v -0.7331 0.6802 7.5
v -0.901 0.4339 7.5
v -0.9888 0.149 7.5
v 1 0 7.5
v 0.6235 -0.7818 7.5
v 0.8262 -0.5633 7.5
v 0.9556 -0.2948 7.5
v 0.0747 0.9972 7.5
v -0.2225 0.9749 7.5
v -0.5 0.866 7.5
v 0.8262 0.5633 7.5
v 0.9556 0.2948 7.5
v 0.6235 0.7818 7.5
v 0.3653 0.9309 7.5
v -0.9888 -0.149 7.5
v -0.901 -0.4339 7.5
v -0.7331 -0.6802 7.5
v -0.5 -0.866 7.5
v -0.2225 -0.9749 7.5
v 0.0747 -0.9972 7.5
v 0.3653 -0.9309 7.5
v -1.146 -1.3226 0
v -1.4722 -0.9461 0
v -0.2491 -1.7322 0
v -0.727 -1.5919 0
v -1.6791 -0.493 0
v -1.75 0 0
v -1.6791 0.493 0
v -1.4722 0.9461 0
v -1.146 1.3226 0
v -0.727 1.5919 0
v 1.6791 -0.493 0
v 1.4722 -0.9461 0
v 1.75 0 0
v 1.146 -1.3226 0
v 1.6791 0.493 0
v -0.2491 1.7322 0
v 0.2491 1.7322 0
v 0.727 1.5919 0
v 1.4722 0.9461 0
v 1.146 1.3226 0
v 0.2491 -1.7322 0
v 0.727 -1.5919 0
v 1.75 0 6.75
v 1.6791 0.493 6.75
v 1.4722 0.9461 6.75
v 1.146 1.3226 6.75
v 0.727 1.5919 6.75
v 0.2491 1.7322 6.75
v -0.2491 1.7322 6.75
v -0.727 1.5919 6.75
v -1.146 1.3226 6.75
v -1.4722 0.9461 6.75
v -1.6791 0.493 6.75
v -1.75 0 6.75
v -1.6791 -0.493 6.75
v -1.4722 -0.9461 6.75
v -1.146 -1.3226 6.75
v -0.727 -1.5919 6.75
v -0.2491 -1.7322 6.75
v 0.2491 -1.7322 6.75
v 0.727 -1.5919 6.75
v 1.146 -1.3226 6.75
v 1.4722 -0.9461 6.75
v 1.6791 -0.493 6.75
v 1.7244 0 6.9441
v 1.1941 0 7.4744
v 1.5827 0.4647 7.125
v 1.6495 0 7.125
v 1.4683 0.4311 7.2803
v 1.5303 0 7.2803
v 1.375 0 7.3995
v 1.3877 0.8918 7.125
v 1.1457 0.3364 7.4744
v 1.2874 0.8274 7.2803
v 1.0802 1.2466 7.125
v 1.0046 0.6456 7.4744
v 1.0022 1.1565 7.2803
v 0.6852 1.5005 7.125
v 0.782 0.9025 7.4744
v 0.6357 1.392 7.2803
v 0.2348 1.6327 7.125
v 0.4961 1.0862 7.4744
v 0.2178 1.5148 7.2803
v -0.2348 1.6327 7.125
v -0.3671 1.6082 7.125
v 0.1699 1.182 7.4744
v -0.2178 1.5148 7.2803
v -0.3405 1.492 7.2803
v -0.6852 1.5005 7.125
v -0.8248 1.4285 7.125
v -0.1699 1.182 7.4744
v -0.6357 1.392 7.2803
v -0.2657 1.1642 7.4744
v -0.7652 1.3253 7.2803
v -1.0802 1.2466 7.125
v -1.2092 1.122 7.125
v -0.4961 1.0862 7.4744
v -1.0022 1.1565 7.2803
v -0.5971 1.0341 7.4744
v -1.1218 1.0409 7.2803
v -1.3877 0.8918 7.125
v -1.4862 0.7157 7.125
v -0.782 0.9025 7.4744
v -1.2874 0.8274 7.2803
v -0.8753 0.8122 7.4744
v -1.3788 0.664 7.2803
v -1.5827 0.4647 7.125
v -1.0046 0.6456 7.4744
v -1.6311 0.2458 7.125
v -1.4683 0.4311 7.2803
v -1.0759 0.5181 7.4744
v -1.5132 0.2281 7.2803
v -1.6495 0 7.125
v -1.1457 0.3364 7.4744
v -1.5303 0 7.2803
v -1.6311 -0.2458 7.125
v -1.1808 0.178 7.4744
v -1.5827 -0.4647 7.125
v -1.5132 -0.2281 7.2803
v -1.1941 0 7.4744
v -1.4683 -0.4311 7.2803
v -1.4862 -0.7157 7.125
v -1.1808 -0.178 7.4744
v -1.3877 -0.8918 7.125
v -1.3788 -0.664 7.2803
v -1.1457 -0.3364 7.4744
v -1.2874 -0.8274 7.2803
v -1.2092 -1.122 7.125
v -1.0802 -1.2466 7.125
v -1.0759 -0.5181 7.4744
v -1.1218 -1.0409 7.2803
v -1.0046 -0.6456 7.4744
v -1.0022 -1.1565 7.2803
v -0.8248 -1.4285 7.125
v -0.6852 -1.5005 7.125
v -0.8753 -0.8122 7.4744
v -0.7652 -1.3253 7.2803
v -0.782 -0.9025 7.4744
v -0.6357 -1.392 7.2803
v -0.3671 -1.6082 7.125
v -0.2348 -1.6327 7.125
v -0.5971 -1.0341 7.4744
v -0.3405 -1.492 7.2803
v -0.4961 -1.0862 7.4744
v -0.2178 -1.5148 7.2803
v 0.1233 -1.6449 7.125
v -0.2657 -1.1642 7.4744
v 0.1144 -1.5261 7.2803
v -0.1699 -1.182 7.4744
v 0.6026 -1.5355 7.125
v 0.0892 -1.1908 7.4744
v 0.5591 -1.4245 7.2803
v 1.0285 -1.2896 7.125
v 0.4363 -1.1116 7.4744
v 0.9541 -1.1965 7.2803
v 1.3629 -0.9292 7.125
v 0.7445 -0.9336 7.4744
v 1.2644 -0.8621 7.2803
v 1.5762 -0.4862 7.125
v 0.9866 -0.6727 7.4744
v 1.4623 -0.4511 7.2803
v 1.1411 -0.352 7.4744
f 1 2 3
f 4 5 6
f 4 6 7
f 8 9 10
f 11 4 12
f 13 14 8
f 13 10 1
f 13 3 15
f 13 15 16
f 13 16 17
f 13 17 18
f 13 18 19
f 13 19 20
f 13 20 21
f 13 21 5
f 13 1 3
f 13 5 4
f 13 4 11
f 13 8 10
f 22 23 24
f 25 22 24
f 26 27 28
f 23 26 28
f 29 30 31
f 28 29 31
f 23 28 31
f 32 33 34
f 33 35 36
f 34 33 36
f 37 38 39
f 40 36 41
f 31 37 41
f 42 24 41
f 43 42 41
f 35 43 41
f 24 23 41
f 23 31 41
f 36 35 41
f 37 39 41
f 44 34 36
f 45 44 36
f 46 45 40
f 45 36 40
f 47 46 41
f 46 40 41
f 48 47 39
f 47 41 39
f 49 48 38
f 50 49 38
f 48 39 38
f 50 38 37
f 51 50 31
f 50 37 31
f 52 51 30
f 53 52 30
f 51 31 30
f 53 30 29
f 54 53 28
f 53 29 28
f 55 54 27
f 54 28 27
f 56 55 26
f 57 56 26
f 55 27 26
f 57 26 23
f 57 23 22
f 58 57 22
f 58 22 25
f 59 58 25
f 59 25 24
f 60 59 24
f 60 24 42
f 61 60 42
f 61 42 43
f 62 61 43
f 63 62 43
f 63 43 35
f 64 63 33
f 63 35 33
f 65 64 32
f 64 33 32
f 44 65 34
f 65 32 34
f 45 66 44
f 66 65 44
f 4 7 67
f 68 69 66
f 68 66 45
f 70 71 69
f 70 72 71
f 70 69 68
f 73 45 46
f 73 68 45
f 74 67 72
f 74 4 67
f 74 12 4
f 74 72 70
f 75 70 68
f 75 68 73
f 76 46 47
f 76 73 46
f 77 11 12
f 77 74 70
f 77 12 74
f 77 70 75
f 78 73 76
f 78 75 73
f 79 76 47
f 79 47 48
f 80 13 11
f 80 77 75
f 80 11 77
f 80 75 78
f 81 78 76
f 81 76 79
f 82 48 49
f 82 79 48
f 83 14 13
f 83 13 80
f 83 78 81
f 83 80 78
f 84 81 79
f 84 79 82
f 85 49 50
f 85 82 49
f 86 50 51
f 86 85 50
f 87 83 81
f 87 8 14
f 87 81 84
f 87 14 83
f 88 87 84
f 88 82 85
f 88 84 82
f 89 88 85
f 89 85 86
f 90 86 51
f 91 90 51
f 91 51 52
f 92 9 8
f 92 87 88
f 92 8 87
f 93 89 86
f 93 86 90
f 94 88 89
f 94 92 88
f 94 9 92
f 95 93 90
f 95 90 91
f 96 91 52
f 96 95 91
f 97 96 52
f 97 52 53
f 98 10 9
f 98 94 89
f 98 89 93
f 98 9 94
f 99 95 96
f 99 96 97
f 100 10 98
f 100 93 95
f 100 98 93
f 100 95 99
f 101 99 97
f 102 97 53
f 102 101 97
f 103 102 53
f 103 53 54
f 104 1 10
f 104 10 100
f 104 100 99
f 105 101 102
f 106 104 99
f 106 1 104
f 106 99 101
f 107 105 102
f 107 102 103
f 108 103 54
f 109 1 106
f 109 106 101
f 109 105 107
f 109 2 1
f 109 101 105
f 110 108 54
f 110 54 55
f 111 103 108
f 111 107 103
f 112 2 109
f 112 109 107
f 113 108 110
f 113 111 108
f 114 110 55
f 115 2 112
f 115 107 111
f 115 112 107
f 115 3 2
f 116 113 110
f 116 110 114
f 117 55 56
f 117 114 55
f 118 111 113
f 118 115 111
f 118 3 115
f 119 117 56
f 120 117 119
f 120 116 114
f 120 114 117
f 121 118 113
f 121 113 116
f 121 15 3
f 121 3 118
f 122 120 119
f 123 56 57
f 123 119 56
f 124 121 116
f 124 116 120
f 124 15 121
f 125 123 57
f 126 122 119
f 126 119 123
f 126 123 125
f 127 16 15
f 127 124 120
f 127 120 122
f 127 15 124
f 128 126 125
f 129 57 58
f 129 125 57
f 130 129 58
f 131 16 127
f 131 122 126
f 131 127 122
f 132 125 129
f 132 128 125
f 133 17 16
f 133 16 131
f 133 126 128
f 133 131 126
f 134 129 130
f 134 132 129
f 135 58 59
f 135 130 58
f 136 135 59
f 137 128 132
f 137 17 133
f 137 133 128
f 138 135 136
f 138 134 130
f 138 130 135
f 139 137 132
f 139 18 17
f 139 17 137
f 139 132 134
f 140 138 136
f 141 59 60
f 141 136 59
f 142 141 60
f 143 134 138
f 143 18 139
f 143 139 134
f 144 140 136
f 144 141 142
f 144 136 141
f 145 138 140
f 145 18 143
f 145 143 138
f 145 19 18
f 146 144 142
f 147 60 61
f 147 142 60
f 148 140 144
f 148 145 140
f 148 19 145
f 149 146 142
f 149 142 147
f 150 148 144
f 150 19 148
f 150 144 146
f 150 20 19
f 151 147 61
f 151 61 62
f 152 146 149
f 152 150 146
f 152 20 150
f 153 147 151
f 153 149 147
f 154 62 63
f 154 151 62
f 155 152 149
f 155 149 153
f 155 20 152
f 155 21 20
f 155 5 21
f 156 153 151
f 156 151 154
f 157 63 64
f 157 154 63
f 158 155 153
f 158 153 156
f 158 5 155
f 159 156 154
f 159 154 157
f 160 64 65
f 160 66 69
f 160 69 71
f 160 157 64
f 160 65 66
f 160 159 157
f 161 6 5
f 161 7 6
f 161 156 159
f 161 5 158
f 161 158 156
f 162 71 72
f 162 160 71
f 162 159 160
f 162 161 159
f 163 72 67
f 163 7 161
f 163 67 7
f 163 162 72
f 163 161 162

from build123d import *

# Parameters (mm, degrees)
F0_R     = 3.5
F1_DEPTH = 15
F2_R     = 1.5
F3_SCALE = 0.5


with BuildPart() as f1:
    # F0 (on Top) → F1 (new body)
    with BuildSketch(Plane.XY):
        Circle(F0_R)
    extrude(amount=F1_DEPTH)

    # F2
    f2_edges = [f1.edges().sort_by_distance(p)[0] for p in [
        (-3.5, 0, 15),
    ]]
    fillet(f2_edges, radius=F2_R)


with BuildPart() as f1_1:
    # F3: moved
    add(f1.part.scale(F3_SCALE))


solid = f1_1.part
